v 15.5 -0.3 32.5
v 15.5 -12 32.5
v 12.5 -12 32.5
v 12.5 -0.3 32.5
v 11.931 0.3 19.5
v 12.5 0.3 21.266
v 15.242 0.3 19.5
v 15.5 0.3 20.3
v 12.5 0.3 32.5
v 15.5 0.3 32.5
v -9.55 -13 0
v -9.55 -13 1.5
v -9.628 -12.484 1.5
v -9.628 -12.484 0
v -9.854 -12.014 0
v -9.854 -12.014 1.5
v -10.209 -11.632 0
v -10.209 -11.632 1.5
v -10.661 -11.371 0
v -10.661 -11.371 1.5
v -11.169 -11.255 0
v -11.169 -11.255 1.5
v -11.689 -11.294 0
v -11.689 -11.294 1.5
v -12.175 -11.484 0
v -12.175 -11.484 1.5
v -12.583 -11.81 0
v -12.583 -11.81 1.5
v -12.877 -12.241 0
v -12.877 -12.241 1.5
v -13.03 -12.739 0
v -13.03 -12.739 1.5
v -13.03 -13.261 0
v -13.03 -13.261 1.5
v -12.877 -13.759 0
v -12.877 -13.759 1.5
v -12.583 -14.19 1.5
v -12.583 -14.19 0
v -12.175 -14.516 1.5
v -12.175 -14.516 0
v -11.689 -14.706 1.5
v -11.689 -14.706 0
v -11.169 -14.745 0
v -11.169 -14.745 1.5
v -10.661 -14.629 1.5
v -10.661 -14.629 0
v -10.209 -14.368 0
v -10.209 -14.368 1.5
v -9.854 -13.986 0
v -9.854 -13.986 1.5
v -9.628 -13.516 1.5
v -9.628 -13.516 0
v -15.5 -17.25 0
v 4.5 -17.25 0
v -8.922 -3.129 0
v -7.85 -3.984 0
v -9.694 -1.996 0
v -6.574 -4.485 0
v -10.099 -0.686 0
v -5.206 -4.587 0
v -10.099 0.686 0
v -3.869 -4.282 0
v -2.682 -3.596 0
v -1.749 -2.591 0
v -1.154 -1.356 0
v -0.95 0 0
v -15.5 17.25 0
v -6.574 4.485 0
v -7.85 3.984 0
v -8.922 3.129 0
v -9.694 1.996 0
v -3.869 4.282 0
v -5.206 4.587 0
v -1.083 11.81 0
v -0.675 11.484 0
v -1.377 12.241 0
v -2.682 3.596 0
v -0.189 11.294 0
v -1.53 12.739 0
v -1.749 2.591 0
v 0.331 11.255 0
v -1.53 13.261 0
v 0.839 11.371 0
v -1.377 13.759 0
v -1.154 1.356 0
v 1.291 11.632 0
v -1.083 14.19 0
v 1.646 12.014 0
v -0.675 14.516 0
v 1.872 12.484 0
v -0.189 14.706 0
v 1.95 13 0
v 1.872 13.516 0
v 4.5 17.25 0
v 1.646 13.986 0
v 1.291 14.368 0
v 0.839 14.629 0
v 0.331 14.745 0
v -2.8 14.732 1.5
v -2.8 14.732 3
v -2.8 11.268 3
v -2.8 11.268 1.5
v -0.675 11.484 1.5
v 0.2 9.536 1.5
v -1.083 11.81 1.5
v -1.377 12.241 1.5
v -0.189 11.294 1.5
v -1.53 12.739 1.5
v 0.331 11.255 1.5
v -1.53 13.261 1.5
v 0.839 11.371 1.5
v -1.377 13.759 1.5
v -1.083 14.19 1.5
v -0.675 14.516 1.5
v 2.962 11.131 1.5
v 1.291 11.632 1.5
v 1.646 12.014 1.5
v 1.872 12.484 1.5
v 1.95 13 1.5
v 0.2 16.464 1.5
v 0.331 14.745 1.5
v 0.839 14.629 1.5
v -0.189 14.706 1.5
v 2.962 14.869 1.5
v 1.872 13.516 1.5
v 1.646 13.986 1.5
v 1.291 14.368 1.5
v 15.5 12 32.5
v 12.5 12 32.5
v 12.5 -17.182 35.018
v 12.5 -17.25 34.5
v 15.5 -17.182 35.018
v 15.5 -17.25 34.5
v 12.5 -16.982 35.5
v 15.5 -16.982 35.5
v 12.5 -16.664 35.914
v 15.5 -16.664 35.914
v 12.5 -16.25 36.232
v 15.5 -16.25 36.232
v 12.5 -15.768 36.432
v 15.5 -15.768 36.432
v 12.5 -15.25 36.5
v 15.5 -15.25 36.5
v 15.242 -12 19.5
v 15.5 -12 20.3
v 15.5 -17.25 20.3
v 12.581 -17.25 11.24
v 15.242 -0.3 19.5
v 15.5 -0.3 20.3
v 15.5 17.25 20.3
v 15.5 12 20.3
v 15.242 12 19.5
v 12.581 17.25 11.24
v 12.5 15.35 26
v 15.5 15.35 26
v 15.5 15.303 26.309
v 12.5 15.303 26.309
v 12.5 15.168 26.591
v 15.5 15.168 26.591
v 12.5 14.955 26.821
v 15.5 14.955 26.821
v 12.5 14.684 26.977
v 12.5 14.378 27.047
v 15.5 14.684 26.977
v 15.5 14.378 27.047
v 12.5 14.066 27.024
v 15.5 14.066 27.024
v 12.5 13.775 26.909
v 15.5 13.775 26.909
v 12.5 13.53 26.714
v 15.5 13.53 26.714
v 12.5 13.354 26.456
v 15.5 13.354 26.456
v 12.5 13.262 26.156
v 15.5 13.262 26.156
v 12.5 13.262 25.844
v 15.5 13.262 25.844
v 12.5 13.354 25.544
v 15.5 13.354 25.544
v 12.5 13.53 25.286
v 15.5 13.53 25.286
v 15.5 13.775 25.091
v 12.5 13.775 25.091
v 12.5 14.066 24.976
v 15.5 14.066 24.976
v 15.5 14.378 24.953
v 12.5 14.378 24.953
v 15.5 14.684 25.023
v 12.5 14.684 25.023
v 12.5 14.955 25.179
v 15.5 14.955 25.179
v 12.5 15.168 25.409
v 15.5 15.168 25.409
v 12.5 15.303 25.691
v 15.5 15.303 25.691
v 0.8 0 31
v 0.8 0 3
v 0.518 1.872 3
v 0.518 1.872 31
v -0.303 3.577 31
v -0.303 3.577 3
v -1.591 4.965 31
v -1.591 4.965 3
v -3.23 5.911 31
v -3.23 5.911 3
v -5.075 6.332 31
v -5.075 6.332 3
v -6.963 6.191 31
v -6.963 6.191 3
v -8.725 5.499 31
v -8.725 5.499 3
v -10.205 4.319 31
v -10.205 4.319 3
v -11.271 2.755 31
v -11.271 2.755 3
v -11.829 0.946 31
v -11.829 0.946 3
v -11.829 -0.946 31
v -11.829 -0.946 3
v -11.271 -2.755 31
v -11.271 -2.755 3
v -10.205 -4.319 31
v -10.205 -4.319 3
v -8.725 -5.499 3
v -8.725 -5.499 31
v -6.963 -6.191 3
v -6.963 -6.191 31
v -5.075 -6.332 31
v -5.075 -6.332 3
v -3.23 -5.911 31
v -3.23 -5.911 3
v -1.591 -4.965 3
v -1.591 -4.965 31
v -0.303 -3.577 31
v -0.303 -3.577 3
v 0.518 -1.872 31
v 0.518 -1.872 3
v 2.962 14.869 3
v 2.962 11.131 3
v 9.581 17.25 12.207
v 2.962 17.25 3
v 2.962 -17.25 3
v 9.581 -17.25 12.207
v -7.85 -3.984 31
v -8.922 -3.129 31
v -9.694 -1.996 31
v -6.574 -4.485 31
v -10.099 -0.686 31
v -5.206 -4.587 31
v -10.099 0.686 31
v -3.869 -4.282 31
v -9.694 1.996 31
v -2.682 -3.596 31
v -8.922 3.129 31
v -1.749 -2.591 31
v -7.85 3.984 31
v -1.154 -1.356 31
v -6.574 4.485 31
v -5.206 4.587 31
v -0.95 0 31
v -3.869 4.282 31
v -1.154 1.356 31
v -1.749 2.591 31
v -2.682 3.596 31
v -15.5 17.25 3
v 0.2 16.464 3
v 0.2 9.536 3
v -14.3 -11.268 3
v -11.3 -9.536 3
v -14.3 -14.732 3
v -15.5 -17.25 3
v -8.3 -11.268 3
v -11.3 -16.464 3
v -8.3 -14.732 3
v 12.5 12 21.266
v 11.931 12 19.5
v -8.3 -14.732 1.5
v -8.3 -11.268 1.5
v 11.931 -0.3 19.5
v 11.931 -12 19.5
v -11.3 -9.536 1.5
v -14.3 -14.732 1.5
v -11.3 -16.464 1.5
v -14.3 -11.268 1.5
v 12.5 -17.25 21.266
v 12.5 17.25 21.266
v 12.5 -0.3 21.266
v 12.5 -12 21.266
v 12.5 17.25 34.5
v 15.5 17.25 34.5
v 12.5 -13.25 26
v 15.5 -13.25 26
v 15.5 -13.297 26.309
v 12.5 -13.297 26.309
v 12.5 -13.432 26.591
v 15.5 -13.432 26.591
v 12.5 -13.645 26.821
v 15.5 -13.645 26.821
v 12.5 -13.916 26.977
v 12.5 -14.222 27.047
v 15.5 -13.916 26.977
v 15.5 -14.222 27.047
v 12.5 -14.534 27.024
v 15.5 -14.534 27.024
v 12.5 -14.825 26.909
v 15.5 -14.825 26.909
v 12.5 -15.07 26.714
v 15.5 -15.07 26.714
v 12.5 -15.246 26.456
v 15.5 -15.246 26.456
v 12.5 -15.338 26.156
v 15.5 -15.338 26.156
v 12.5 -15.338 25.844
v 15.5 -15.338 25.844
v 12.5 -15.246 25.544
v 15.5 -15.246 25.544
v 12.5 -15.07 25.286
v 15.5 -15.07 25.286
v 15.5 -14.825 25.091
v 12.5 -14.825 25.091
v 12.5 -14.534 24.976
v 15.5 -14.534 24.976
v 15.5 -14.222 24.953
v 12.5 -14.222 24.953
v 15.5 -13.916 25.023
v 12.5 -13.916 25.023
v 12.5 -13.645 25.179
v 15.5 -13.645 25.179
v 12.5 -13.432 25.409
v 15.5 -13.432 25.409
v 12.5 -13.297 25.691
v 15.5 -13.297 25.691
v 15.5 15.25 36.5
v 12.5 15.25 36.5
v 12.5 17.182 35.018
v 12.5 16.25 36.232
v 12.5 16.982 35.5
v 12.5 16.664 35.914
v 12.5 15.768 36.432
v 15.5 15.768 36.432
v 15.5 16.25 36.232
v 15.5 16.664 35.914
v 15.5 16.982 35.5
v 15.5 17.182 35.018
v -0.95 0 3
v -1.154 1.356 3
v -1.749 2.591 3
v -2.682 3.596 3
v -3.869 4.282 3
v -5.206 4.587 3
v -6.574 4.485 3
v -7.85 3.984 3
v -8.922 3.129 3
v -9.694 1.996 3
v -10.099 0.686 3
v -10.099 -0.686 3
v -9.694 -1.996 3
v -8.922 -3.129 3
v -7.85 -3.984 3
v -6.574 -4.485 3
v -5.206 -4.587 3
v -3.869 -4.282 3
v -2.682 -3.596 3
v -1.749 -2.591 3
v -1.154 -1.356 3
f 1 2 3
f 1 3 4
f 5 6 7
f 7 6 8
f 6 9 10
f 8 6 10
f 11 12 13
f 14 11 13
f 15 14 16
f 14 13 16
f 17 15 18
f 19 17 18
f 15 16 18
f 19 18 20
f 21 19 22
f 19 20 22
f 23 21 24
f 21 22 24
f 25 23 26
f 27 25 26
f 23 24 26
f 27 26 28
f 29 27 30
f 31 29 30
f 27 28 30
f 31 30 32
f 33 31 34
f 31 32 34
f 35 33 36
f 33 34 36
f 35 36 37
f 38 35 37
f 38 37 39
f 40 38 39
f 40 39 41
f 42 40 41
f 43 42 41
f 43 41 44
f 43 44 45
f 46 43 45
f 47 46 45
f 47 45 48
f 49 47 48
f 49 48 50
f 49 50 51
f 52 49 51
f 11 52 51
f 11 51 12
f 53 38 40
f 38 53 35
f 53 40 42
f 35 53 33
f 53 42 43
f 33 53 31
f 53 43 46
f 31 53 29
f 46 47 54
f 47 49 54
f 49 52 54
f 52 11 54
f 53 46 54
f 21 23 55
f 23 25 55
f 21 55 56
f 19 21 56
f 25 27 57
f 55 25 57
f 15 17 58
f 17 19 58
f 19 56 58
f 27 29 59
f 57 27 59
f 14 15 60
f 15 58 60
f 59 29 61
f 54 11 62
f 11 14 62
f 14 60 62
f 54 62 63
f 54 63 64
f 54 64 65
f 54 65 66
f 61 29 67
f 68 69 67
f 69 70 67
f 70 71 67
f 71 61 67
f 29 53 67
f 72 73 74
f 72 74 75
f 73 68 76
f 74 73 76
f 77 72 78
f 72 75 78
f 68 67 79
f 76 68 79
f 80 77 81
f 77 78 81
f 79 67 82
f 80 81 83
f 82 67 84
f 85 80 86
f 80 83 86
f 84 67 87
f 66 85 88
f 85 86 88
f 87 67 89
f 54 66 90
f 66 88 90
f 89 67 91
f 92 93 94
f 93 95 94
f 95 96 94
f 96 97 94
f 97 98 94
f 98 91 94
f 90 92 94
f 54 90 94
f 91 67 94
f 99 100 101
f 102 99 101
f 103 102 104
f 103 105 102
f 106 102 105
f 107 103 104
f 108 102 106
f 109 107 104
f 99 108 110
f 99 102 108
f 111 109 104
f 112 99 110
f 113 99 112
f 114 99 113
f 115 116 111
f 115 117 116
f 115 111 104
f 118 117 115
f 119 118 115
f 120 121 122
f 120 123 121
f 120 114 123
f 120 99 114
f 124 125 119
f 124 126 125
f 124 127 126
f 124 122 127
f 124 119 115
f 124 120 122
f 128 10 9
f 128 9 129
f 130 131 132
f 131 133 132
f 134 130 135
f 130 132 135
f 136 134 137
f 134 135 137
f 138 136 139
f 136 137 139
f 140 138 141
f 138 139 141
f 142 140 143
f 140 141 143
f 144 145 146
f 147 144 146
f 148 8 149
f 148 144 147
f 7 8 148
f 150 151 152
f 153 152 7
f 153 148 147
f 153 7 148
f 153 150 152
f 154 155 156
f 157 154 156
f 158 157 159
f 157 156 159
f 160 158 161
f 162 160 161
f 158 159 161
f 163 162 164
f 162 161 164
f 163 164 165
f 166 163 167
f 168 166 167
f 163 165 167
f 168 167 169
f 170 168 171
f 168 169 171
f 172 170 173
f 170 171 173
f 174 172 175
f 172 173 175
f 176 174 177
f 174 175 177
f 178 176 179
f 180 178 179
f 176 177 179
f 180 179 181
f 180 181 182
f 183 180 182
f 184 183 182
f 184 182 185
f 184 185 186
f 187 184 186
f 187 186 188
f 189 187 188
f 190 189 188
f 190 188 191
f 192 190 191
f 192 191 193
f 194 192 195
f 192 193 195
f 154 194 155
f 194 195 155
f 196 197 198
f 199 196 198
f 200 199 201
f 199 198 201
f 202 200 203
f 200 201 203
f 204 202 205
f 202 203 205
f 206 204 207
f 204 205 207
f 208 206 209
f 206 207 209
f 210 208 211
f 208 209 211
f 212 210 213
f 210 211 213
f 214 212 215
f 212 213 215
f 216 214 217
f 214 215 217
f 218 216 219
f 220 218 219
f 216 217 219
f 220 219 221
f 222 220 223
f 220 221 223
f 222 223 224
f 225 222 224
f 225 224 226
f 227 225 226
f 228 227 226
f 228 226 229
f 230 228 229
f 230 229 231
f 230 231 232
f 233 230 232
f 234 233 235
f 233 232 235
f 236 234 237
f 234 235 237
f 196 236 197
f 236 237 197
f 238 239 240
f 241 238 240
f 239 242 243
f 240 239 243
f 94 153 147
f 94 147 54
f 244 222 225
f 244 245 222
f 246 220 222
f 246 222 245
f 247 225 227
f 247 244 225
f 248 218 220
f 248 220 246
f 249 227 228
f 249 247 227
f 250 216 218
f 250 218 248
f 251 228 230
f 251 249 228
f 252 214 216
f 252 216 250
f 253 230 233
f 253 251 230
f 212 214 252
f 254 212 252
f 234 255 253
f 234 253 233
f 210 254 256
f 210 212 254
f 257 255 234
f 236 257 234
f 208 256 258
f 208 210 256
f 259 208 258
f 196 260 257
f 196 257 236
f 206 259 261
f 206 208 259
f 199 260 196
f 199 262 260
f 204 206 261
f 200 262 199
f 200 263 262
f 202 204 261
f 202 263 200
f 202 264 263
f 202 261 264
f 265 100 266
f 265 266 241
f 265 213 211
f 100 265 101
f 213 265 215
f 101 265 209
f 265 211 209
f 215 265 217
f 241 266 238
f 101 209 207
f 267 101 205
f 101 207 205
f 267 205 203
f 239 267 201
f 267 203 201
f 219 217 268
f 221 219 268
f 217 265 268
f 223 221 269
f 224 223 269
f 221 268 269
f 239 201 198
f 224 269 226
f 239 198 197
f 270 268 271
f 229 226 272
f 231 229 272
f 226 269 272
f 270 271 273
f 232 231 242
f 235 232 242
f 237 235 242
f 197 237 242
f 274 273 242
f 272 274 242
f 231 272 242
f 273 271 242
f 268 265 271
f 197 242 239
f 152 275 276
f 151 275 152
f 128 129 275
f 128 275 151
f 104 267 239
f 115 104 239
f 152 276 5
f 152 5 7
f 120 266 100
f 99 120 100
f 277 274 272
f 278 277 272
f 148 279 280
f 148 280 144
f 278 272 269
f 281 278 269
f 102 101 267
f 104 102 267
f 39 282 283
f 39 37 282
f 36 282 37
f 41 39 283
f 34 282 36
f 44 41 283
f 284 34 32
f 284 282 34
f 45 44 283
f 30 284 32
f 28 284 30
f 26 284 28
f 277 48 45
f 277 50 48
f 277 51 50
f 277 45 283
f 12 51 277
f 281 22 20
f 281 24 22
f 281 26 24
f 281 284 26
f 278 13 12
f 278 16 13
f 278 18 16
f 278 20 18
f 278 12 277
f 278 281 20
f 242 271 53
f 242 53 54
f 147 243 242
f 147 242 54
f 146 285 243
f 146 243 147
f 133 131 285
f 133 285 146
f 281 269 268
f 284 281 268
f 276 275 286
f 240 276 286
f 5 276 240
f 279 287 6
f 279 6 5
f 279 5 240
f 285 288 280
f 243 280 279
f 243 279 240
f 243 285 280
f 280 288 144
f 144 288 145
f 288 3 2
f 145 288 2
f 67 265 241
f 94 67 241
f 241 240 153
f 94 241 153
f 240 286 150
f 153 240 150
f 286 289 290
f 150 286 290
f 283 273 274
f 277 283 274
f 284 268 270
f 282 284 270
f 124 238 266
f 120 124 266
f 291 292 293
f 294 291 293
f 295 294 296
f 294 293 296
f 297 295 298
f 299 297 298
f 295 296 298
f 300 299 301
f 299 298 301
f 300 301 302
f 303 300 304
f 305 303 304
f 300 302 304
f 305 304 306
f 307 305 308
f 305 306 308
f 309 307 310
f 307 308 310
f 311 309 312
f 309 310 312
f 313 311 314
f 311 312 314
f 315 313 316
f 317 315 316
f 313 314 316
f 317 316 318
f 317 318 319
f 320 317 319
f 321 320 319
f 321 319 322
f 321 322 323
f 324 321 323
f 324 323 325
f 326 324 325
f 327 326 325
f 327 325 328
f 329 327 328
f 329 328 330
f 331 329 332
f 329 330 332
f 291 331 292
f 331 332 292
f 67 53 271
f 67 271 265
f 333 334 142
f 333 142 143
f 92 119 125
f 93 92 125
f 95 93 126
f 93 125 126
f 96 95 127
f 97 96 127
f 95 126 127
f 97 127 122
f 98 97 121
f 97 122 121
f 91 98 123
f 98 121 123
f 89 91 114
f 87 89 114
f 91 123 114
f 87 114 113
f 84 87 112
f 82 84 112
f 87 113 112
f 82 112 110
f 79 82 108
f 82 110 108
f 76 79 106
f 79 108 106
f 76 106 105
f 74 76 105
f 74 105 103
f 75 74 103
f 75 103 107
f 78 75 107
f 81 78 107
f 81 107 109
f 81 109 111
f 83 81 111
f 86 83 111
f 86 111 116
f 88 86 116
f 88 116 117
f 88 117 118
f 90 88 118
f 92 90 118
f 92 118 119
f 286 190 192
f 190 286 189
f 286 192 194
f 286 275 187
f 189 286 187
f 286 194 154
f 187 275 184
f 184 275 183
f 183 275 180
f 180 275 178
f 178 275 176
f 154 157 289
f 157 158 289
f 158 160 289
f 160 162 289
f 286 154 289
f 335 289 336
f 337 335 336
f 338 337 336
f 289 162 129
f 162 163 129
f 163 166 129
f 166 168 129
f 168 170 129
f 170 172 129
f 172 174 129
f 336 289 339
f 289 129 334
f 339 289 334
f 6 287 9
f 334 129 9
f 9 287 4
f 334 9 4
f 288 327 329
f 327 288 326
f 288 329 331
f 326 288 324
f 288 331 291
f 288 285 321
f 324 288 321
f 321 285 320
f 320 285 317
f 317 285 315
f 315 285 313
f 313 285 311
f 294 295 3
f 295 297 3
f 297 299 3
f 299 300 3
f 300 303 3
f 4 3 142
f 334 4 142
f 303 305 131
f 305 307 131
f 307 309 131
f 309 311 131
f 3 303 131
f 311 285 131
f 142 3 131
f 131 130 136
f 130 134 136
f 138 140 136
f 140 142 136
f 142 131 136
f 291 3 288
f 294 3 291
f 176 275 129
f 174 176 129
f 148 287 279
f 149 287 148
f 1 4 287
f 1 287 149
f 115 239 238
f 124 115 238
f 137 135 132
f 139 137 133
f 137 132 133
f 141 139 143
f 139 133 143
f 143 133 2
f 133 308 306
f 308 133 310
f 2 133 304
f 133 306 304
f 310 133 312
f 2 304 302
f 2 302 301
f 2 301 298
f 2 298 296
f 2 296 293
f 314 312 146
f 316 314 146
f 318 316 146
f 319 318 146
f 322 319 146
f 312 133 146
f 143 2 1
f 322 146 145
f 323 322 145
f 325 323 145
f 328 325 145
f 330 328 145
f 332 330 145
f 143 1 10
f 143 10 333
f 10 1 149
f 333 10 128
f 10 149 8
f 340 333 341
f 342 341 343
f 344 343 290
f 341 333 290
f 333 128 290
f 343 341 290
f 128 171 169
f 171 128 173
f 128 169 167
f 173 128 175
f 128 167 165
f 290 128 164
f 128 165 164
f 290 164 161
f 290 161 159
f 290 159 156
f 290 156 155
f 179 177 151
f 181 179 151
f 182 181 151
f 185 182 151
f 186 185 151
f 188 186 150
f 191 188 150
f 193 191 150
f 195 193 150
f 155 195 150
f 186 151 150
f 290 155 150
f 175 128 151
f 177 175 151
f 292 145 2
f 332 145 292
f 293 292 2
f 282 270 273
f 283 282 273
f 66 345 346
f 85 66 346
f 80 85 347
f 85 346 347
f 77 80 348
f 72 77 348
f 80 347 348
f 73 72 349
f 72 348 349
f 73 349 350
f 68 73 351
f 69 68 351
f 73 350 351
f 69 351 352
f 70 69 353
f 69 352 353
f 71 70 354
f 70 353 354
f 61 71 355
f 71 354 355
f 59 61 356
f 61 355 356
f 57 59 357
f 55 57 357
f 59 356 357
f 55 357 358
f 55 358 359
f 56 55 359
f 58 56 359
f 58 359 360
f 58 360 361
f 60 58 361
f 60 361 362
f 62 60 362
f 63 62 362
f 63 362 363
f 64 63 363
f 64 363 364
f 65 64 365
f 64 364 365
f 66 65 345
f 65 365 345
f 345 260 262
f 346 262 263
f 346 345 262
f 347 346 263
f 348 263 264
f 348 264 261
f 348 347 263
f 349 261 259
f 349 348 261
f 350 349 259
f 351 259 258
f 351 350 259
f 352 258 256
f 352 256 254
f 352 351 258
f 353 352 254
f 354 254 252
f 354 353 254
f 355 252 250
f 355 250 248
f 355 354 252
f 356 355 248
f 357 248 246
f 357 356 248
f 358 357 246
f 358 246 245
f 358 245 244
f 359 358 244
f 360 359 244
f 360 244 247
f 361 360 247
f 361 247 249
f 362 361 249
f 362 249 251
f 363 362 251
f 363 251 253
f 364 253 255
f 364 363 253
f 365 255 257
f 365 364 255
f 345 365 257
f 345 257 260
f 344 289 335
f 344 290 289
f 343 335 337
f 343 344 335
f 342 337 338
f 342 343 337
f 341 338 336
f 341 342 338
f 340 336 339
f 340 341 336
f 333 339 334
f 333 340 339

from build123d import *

# Parameters (mm, degrees)
F0_W          = 31
F0_H          = 34.5
F1_DEPTH      = 36.5
F3_DEPTH      = 34.5
F5_R          = 6.35
F5_R_2        = 4.6
F6_DEPTH      = 28
F7_W          = 11.7
F7_H          = 13
F7_R          = 1.05
F8_DEPTH      = 3.0000000261
F4_R          = 1.75
F9_DEPTH      = 3.0000000261
F10_DEPTH     = 1.5
F11_DEPTH     = 3.0000000261
F12_R         = 2
F13_T4_DEPTH  = 47.4768176547
F13_T9_DEPTH  = 47.4768176547
F13_T15_DEPTH = 60.4536353093
F13_T21_DEPTH = 47.4768176547
F13_T23_DEPTH = 60.4536353093


# Not quite as in the source:
# - a fillet or chamfer that OpenCascade refuses, or shapes differently, is made with other operations: its cross-section is extruded or revolved along the edge and cut away or added
# - a feature names something its author has since deleted; it is built from what else it names


with BuildPart() as f1:
    # F0 (on Top) → F1 (new body)
    with BuildSketch(Plane.XY):
        Rectangle(F0_W, F0_H)
    extrude(amount=F1_DEPTH)

    # F2 (on face) → F3 (cut, through all)
    with BuildSketch(Plane.XZ.offset(17.25)):
        Polygon((-15.5, 36.5), (-15.5, 3.0000000261), (2.9619937352, 3.0000000261), (12.4999999739, 16.2664996126), (12.4999999739, 36.5), align=None)
        Polygon((15.5, 15.3), (4.5, 0), (15.5, 0), align=None)
    extrude(amount=-F3_DEPTH, mode=Mode.SUBTRACT)

    # F5 (on face) → F6 (join)
    with BuildSketch(Plane.XY.offset(3.0000000261)):
        with Locations((-5.55, 0)):
            Circle(F5_R)
        with Locations((-5.55, 0)):
            Circle(F5_R_2, mode=Mode.SUBTRACT)
    extrude(amount=F6_DEPTH)

    # F7 (on face) → F8 (cut, through all)
    with BuildSketch(Plane.YZ.offset(15.5)):
        with Locations((6.15, 26)):
            Rectangle(F7_W, F7_H)
        with Locations((-6.15, 26)):
            Rectangle(F7_W, F7_H)
        with Locations((-14.3, 26)):
            Circle(F7_R)
        with Locations((14.3, 26)):
            Circle(F7_R)
    extrude(amount=-F8_DEPTH, mode=Mode.SUBTRACT)

    # F4 (on face) → F9 (cut, through all)
    with BuildSketch(Plane.XY.offset(3.0000000261)):
        with Locations((-11.3, -13)):
            Circle(F4_R)
        with Locations((0.2, 13)):
            Circle(F4_R)
    extrude(amount=-F9_DEPTH, mode=Mode.SUBTRACT)

    # F4 (on face) → F10 (cut)
    with BuildSketch(Plane.XY.offset(3.0000000261)):
        Polygon((-14.3, -11.2679491924), (-14.3, -14.7320508076), (-11.3, -16.4641016151), (-8.3, -14.7320508076), (-8.3, -11.2679491924), (-11.3, -9.5358983849), align=None)
        with Locations((-11.3, -13)):
            Circle(F4_R, mode=Mode.SUBTRACT)
        Polygon((0.2, 16.4641016151), (-2.8, 14.7320508076), (-2.8, 11.2679491924), (0.2, 9.5358983849), (2.9619937352, 11.1305362114), (2.9619937352, 14.8694637886), align=None)
        with Locations((0.2, 13)):
            Circle(F4_R, mode=Mode.SUBTRACT)
    extrude(amount=-F10_DEPTH, mode=Mode.SUBTRACT)

    # F5 (on face) → F11 (cut, through all)
    with BuildSketch(Plane.XY.offset(3.0000000261)):
        with Locations((-5.55, 0)):
            Circle(F5_R_2)
    extrude(amount=-F11_DEPTH, mode=Mode.SUBTRACT)

    # F12
    f12_edges = [f1.edges().sort_by_distance(p)[0] for p in [
        (14, -17.25, 36.5),
        (14, 17.25, 36.5),
    ]]
    fillet(f12_edges, radius=F12_R)

    # F13: chamfer of 5 on 2 edges, made by hand


with BuildPart() as f13_tool2:
    # F13_s3 → F13_t4 (new body)
    with BuildSketch(Plane.XZ.offset(17.25)):
        Polygon((12.4999999739, 21.2664996126), (9.5812730216, 12.2068157607), (12.4999999739, 16.2664996126), align=None)
    extrude(amount=-F13_T4_DEPTH)

    split(bisect_by=Plane.XZ.offset(12), keep=Keep.TOP)


with BuildPart() as f1_1:
    add(f1.part)

    # F13_t1: union F13_tool2
    add(f13_tool2.part)


with BuildPart() as f13_tool7:
    # F13_s8 → F13_t9 (new body)
    with BuildSketch(Plane.XZ.offset(30.2268176547)):
        Polygon((12.4999999739, 21.2664996126), (9.5812730216, 12.2068157607), (12.4999999739, 16.2664996126), align=None)
    extrude(amount=-F13_T9_DEPTH)

    split(bisect_by=Plane.XY.offset(19.5), keep=Keep.BOTTOM)

    split(bisect_by=Plane.XZ.offset(12), keep=Keep.BOTTOM)


with BuildPart() as f1_2:
    add(f1_1.part)

    # F13_t6: union F13_tool7
    add(f13_tool7.part)


with BuildPart() as f13_tool13:
    # F13_s14 → F13_t15 (new body)
    with BuildSketch(Plane.XZ.offset(30.2268176547)):
        Polygon((12.4999999739, 21.2664996126), (9.5812730216, 12.2068157607), (12.4999999739, 16.2664996126), align=None)
    extrude(amount=-F13_T15_DEPTH)

    split(bisect_by=Plane.XZ.offset(-0.3), keep=Keep.TOP)

    split(bisect_by=Plane.XZ.offset(0.3), keep=Keep.BOTTOM)


with BuildPart() as f1_3:
    add(f1_2.part)

    # F13_t12: union F13_tool13
    add(f13_tool13.part)


with BuildPart() as f13_tool19:
    # F13_s20 → F13_t21 (new body)
    with BuildSketch(Plane.XZ.offset(30.2268176547)):
        Polygon((12.4999999739, 21.2664996126), (9.5812730216, 12.2068157607), (12.4999999739, 16.2664996126), align=None)
    extrude(amount=-F13_T21_DEPTH)

    split(bisect_by=Plane.XZ.offset(-12), keep=Keep.BOTTOM)


with BuildPart() as f1_4:
    add(f1_3.part)

    # F13_t18: union F13_tool19
    add(f13_tool19.part)

    # F13_s24 → F13_t23 (cut)
    with BuildSketch(Plane.XZ.offset(-30.2268176547)):
        Polygon((15.5, 20.3), (12.5812730476, 11.2403161481), (15.5, 15.3), align=None)
    extrude(amount=F13_T23_DEPTH, mode=Mode.SUBTRACT)


solid = f1_4.part
